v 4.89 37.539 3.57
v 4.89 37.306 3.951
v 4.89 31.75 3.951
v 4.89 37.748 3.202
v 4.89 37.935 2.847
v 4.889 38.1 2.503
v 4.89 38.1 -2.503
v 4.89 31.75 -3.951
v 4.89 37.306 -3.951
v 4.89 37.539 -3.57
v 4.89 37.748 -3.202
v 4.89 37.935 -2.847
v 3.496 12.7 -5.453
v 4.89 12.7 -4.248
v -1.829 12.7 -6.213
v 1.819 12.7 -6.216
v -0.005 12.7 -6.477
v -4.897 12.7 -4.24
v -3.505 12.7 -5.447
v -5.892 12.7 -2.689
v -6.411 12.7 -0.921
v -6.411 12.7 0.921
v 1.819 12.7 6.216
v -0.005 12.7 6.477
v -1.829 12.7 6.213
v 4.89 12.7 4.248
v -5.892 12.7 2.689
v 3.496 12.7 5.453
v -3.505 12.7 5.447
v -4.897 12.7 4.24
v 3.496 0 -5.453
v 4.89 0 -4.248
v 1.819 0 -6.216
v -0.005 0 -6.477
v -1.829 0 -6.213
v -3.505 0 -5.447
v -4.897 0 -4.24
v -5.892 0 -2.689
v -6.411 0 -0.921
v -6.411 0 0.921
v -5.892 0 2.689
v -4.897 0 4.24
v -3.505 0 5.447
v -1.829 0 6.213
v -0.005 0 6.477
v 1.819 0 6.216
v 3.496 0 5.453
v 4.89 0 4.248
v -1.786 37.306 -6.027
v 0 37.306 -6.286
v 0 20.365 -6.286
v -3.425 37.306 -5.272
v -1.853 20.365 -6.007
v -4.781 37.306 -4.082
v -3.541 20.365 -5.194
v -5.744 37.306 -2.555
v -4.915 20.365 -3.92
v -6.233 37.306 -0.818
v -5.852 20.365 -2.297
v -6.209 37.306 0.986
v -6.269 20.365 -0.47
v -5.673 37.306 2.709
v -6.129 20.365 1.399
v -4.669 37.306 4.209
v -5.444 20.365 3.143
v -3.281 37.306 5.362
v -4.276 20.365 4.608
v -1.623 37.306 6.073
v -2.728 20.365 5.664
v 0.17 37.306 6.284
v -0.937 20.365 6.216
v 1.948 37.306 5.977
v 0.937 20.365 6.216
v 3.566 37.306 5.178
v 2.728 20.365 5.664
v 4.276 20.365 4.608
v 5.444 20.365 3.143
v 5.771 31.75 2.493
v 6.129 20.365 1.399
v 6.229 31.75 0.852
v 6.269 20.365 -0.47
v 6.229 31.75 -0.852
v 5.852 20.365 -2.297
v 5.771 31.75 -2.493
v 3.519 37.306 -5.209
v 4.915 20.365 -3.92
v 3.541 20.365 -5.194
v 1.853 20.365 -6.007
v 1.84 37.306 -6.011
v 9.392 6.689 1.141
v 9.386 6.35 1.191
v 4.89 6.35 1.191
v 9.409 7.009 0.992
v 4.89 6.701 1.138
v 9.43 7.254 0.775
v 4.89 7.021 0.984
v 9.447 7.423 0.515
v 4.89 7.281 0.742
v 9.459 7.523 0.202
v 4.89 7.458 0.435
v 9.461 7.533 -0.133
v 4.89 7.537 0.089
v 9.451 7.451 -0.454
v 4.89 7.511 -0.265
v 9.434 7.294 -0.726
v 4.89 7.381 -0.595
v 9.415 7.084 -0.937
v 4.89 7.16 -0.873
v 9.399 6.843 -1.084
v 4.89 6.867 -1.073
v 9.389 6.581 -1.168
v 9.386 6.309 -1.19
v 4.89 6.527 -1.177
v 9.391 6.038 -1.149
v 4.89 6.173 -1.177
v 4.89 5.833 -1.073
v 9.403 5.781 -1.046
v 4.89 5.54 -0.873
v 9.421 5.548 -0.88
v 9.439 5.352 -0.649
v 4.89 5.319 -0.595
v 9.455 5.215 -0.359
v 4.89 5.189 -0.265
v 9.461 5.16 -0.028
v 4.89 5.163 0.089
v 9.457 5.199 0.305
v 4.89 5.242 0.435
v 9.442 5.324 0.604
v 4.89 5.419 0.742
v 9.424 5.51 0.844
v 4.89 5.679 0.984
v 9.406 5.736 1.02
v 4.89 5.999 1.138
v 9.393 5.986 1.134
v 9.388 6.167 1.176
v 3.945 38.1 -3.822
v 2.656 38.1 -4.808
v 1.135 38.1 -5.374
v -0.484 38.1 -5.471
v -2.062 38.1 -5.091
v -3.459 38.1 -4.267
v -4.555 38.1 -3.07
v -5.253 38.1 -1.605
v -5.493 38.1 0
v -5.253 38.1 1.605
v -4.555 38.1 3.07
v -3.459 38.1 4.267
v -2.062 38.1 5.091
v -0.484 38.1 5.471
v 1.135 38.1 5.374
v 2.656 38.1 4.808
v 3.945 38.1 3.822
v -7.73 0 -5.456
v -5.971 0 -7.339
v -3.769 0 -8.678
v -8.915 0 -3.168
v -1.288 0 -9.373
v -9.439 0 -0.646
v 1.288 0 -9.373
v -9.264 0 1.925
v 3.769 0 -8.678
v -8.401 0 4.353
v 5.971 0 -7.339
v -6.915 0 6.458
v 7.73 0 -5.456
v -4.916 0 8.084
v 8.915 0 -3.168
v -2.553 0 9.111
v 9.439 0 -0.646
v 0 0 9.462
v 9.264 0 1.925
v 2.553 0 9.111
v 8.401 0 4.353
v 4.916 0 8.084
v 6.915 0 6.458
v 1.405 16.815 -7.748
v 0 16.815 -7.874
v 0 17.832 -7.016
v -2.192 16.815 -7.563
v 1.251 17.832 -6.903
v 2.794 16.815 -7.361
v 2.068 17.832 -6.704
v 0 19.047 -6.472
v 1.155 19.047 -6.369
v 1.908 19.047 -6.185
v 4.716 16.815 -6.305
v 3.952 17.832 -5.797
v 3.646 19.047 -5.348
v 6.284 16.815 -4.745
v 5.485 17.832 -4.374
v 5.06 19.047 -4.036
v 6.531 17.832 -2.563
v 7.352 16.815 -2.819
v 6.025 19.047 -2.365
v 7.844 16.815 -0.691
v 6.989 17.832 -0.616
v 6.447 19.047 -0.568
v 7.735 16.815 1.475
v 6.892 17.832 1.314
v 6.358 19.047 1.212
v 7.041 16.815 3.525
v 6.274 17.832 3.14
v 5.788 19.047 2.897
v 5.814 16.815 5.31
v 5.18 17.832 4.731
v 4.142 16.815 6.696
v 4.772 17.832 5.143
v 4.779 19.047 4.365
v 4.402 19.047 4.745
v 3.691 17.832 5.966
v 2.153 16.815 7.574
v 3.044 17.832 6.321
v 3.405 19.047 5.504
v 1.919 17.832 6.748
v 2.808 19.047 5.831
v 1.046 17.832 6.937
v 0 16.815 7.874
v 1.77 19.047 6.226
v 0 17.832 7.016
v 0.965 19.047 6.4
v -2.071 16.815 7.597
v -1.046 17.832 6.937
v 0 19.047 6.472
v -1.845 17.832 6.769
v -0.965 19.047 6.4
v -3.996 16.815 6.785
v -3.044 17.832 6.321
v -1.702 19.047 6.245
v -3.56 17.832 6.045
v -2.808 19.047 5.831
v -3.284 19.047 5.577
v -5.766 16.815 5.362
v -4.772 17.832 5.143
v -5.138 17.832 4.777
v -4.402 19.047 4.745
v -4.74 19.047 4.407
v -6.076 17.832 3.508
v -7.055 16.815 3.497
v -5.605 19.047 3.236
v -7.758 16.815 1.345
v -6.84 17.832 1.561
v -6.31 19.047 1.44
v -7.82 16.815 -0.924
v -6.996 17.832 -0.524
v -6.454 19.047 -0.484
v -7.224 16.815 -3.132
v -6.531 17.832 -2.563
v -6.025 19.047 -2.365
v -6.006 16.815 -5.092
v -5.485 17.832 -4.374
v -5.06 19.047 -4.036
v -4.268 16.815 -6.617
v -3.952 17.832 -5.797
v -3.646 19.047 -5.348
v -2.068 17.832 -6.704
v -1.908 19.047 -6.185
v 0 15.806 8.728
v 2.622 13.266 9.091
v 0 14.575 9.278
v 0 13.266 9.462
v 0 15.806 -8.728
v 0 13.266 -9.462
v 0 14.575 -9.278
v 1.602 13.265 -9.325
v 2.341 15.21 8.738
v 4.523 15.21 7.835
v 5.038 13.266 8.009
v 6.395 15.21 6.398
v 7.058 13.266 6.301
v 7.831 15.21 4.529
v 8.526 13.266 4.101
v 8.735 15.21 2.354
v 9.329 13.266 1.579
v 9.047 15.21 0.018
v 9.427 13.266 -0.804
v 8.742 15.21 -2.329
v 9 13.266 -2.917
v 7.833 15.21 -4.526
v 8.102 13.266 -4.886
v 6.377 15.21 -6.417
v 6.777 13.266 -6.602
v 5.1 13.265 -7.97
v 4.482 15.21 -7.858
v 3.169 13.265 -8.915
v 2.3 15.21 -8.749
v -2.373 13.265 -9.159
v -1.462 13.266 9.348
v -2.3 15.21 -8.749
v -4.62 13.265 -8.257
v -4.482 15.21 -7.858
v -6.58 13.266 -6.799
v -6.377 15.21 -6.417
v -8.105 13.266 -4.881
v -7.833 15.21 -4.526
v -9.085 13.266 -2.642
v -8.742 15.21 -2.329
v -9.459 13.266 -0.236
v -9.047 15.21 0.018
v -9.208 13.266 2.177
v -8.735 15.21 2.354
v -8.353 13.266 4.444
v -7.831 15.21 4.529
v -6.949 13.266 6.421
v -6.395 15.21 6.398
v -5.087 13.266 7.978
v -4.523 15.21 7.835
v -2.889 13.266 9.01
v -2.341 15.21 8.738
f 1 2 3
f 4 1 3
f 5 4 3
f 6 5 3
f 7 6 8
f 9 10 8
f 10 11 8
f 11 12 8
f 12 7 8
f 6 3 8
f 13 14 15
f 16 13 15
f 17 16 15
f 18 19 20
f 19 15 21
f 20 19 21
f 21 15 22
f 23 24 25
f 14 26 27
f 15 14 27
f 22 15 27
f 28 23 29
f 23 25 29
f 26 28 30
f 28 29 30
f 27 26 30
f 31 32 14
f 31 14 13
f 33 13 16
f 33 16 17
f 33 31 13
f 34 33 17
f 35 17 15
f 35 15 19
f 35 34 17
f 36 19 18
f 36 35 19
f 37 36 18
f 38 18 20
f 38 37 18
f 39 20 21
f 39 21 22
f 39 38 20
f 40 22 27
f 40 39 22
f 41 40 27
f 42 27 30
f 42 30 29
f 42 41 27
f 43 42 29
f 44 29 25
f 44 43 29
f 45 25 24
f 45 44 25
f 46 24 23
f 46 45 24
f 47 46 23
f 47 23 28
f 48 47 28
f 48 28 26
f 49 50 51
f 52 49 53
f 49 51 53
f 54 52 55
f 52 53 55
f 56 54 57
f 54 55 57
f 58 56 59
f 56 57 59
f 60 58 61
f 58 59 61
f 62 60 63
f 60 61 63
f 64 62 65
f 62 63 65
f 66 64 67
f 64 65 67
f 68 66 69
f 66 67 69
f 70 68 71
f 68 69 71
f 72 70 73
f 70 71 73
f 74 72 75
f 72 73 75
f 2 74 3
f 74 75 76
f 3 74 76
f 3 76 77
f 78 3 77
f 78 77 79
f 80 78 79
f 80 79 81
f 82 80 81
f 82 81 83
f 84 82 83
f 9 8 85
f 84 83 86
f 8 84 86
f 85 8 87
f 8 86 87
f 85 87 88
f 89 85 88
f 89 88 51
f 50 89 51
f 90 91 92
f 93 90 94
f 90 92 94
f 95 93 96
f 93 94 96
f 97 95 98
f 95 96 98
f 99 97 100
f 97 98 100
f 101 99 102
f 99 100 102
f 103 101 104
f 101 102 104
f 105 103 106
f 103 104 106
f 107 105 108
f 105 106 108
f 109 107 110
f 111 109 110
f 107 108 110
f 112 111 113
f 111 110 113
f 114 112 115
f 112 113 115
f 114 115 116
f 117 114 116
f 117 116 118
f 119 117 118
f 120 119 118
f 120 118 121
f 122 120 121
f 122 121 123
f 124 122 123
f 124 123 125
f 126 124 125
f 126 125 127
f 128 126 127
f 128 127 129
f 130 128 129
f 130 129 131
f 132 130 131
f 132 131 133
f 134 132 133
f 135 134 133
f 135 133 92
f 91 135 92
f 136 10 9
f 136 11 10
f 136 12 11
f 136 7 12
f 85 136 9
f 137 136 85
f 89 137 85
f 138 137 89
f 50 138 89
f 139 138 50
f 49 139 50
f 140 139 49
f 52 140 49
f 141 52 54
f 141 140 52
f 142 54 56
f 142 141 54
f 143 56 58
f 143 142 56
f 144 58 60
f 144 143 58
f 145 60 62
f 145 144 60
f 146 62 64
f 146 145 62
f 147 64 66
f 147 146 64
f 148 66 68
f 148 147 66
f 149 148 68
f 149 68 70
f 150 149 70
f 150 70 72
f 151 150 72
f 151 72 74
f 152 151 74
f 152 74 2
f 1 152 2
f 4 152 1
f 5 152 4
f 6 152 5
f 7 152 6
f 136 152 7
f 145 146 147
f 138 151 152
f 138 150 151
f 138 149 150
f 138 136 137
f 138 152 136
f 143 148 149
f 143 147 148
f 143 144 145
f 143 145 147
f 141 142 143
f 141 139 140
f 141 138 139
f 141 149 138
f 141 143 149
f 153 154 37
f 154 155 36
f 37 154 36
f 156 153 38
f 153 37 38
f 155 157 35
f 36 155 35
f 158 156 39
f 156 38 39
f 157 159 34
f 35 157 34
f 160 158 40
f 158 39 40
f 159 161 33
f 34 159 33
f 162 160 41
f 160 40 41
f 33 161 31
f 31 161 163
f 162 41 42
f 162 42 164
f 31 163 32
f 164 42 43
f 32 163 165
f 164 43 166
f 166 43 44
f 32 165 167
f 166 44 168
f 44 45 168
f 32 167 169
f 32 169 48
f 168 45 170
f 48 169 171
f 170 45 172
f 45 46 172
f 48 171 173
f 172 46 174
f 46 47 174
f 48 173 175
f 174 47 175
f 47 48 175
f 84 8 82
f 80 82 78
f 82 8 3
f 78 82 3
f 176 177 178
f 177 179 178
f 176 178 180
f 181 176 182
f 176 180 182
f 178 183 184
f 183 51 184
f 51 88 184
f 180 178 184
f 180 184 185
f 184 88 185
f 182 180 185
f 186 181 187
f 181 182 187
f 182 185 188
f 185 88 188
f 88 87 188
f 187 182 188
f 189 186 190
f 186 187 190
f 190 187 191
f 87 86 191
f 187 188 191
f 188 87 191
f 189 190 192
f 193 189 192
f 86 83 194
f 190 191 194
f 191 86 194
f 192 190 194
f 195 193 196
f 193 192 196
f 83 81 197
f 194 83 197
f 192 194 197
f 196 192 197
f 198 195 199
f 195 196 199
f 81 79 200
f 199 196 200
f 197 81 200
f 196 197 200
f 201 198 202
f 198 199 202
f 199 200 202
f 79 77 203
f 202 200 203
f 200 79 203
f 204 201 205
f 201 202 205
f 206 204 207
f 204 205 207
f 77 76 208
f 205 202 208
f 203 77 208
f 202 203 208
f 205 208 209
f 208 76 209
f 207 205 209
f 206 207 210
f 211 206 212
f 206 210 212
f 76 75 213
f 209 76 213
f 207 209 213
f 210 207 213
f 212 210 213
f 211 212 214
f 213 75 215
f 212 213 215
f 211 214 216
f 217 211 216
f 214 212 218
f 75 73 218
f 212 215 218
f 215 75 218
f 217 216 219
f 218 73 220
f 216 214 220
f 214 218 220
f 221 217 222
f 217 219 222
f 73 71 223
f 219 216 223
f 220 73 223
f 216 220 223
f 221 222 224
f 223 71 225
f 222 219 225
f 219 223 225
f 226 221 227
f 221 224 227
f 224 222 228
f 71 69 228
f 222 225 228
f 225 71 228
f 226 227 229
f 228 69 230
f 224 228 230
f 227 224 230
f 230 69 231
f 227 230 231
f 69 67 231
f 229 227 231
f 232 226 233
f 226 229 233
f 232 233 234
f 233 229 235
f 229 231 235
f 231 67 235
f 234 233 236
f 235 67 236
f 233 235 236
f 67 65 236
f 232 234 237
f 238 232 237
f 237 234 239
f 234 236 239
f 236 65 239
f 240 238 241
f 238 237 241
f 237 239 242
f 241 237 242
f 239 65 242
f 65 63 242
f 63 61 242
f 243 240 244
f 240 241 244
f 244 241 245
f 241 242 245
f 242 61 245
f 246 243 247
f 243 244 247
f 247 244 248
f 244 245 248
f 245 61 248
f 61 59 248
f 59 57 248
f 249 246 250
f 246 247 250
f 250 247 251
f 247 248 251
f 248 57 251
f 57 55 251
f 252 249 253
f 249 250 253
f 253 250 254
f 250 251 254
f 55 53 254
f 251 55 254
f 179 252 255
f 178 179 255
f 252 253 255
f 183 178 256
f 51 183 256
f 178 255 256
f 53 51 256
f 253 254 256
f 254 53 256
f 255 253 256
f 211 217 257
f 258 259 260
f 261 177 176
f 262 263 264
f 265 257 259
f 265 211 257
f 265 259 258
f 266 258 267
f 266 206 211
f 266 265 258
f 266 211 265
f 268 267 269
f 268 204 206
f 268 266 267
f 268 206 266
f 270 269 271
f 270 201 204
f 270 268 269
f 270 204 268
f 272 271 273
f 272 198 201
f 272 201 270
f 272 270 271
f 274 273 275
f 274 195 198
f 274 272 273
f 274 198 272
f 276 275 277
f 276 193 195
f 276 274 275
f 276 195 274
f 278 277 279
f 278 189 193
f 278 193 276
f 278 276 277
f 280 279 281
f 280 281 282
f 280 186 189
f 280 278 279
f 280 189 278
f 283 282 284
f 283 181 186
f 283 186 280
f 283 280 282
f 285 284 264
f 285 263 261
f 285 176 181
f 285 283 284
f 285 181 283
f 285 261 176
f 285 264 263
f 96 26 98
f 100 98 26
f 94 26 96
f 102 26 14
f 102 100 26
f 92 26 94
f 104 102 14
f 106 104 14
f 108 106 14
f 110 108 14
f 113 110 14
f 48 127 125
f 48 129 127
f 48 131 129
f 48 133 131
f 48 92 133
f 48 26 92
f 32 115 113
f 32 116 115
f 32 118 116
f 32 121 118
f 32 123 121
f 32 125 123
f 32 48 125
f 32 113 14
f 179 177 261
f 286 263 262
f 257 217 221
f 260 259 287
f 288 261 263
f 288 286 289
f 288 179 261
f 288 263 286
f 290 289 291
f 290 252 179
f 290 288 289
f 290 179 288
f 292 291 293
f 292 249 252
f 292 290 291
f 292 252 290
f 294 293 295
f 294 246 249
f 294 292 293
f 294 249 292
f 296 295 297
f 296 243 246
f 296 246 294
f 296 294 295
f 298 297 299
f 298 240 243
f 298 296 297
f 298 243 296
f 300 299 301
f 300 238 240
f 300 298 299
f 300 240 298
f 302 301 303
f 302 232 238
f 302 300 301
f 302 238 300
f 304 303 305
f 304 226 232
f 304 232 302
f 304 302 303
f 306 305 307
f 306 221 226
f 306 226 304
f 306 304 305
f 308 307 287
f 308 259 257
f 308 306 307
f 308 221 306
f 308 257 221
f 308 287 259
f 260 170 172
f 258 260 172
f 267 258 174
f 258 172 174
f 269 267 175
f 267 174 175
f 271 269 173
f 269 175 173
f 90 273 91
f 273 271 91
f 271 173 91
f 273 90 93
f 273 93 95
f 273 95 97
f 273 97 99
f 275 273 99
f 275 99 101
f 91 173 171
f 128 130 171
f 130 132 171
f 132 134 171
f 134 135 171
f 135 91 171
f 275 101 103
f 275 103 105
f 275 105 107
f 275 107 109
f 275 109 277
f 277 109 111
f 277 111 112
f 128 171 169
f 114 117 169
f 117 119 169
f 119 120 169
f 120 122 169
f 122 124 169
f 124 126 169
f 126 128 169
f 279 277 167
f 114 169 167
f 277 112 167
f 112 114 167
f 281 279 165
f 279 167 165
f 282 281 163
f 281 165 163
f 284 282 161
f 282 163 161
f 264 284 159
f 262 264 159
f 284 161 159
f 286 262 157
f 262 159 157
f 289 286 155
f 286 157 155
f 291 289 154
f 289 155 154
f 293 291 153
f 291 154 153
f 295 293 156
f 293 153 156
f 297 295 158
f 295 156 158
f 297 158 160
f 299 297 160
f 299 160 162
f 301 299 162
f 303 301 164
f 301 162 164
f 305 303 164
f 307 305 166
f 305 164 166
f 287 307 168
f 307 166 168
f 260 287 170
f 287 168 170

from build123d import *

# Parameters (mm, degrees)
SKETCH1_R           = 6.2865
BASE_EXTRUDE_DEPTH  = 38.1
SKETCH3_R           = 9.4615
BOSS_EXTRUDE1_DEPTH = 15.875
CUT_EXTRUDE1_DEPTH  = 12.7
FILLET1_R           = 4.7625
FILLET2_R           = 4.7625
SKETCH5_R           = 1.190625
CUT_EXTRUDE2_DEPTH  = 42.798101456
CUT_EXTRUDE3_START  = -6.35
CUT_EXTRUDE3_DEPTH  = 6.35
CHAMFER1_SIZE       = 0.79375


with BuildPart() as part:
    # Sketch1 → Base-Extrude (new body)
    with BuildSketch(Plane(origin=(0, 0, 0), x_dir=(-1, 0, 0), z_dir=(0, 1, 0))):
        with Locations(Location((0, 0, 0), (0, 0, 270))):
            Circle(SKETCH1_R)
    extrude(amount=BASE_EXTRUDE_DEPTH)

    # Sketch3 → Boss-Extrude1 (add)
    with BuildSketch(Plane(origin=(0, 0, 0), x_dir=(-1, 0, 0), z_dir=(0, 1, 0))):
        with Locations(Location((0, 0, 0), (0, 0, 90))):
            Circle(SKETCH3_R)
    extrude(amount=BOSS_EXTRUDE1_DEPTH)

    # Sketch4 → Cut-Extrude1 (cut)
    with BuildSketch(Plane(origin=(0, 0, 0), x_dir=(-1, 0, 0), z_dir=(0, 1, 0))):
        with BuildLine():
            Line((-4.8895, 4.247860491), (-4.8895, -4.247860491))
            ThreePointArc((-4.8895, -4.247860491), (6.477, 0), (-4.8895, 4.247860491))
        make_face()
    extrude(amount=CUT_EXTRUDE1_DEPTH, mode=Mode.SUBTRACT)

    # Fillet1
    # the kernel refuses this fillet: 4.7625 mm, written as the material it adds along each edge
    with BuildSketch(Plane(origin=(0, 15.875, 0), x_dir=(0, 0, -1), z_dir=(-1, 0, 0))) as fillet1_piece_1:
        with BuildLine():
            CenterArc((11.049, -4.490128061), FILLET1_R, 109.471220634, 70.528779366)
            Line((6.2865, -4.490128061), (6.19125, -4.490128061))
            Line((6.19125, -4.490128061), (6.19125, 0))
            Line((6.19125, 0), (6.2865, 0.09525))
            ThreePointArc((6.2865, 0.09525), (7.874, 0.09525), (9.42975, 0.089802561))
            Line((9.42975, 0.089802561), (9.4615, 0))
        make_face()
    revolve(axis=Axis((0, 15.875, 0), (0, -1, 0)))

    # Fillet2
    fillet2_edges = [part.edges().sort_by_distance(p)[0] for p in [
        (9.4615, 15.875, 0),
    ]]
    fillet(fillet2_edges, radius=FILLET2_R)

    # Sketch5 → Cut-Extrude2 (cut, through all)
    with BuildSketch(Plane.ZY.offset(-4.8895)):
        with Locations((0, 6.35)):
            Circle(SKETCH5_R)
    extrude(amount=-CUT_EXTRUDE2_DEPTH, mode=Mode.SUBTRACT)

    # Sketch7 → Cut-Extrude3 (cut)
    with BuildSketch(Plane(origin=(0, 38.1, 0), x_dir=(-1, 0, 0), z_dir=(0, 1, 0)).offset(CUT_EXTRUDE3_START)):
        with BuildLine():
            Line((-4.8895, 3.951312693), (-4.8895, -3.951312693))
            ThreePointArc((-4.8895, -3.951312693), (-6.2865, 0), (-4.8895, 3.951312693))
        make_face()
    extrude(amount=CUT_EXTRUDE3_DEPTH, mode=Mode.SUBTRACT)

    # Chamfer1
    chamfer1_edges = [part.edges().sort_by_distance(p)[0] for p in [
        (-5.67274226, 38.1, 2.70925774),
    ]]
    chamfer(chamfer1_edges, length=CHAMFER1_SIZE)


solid = part.part
